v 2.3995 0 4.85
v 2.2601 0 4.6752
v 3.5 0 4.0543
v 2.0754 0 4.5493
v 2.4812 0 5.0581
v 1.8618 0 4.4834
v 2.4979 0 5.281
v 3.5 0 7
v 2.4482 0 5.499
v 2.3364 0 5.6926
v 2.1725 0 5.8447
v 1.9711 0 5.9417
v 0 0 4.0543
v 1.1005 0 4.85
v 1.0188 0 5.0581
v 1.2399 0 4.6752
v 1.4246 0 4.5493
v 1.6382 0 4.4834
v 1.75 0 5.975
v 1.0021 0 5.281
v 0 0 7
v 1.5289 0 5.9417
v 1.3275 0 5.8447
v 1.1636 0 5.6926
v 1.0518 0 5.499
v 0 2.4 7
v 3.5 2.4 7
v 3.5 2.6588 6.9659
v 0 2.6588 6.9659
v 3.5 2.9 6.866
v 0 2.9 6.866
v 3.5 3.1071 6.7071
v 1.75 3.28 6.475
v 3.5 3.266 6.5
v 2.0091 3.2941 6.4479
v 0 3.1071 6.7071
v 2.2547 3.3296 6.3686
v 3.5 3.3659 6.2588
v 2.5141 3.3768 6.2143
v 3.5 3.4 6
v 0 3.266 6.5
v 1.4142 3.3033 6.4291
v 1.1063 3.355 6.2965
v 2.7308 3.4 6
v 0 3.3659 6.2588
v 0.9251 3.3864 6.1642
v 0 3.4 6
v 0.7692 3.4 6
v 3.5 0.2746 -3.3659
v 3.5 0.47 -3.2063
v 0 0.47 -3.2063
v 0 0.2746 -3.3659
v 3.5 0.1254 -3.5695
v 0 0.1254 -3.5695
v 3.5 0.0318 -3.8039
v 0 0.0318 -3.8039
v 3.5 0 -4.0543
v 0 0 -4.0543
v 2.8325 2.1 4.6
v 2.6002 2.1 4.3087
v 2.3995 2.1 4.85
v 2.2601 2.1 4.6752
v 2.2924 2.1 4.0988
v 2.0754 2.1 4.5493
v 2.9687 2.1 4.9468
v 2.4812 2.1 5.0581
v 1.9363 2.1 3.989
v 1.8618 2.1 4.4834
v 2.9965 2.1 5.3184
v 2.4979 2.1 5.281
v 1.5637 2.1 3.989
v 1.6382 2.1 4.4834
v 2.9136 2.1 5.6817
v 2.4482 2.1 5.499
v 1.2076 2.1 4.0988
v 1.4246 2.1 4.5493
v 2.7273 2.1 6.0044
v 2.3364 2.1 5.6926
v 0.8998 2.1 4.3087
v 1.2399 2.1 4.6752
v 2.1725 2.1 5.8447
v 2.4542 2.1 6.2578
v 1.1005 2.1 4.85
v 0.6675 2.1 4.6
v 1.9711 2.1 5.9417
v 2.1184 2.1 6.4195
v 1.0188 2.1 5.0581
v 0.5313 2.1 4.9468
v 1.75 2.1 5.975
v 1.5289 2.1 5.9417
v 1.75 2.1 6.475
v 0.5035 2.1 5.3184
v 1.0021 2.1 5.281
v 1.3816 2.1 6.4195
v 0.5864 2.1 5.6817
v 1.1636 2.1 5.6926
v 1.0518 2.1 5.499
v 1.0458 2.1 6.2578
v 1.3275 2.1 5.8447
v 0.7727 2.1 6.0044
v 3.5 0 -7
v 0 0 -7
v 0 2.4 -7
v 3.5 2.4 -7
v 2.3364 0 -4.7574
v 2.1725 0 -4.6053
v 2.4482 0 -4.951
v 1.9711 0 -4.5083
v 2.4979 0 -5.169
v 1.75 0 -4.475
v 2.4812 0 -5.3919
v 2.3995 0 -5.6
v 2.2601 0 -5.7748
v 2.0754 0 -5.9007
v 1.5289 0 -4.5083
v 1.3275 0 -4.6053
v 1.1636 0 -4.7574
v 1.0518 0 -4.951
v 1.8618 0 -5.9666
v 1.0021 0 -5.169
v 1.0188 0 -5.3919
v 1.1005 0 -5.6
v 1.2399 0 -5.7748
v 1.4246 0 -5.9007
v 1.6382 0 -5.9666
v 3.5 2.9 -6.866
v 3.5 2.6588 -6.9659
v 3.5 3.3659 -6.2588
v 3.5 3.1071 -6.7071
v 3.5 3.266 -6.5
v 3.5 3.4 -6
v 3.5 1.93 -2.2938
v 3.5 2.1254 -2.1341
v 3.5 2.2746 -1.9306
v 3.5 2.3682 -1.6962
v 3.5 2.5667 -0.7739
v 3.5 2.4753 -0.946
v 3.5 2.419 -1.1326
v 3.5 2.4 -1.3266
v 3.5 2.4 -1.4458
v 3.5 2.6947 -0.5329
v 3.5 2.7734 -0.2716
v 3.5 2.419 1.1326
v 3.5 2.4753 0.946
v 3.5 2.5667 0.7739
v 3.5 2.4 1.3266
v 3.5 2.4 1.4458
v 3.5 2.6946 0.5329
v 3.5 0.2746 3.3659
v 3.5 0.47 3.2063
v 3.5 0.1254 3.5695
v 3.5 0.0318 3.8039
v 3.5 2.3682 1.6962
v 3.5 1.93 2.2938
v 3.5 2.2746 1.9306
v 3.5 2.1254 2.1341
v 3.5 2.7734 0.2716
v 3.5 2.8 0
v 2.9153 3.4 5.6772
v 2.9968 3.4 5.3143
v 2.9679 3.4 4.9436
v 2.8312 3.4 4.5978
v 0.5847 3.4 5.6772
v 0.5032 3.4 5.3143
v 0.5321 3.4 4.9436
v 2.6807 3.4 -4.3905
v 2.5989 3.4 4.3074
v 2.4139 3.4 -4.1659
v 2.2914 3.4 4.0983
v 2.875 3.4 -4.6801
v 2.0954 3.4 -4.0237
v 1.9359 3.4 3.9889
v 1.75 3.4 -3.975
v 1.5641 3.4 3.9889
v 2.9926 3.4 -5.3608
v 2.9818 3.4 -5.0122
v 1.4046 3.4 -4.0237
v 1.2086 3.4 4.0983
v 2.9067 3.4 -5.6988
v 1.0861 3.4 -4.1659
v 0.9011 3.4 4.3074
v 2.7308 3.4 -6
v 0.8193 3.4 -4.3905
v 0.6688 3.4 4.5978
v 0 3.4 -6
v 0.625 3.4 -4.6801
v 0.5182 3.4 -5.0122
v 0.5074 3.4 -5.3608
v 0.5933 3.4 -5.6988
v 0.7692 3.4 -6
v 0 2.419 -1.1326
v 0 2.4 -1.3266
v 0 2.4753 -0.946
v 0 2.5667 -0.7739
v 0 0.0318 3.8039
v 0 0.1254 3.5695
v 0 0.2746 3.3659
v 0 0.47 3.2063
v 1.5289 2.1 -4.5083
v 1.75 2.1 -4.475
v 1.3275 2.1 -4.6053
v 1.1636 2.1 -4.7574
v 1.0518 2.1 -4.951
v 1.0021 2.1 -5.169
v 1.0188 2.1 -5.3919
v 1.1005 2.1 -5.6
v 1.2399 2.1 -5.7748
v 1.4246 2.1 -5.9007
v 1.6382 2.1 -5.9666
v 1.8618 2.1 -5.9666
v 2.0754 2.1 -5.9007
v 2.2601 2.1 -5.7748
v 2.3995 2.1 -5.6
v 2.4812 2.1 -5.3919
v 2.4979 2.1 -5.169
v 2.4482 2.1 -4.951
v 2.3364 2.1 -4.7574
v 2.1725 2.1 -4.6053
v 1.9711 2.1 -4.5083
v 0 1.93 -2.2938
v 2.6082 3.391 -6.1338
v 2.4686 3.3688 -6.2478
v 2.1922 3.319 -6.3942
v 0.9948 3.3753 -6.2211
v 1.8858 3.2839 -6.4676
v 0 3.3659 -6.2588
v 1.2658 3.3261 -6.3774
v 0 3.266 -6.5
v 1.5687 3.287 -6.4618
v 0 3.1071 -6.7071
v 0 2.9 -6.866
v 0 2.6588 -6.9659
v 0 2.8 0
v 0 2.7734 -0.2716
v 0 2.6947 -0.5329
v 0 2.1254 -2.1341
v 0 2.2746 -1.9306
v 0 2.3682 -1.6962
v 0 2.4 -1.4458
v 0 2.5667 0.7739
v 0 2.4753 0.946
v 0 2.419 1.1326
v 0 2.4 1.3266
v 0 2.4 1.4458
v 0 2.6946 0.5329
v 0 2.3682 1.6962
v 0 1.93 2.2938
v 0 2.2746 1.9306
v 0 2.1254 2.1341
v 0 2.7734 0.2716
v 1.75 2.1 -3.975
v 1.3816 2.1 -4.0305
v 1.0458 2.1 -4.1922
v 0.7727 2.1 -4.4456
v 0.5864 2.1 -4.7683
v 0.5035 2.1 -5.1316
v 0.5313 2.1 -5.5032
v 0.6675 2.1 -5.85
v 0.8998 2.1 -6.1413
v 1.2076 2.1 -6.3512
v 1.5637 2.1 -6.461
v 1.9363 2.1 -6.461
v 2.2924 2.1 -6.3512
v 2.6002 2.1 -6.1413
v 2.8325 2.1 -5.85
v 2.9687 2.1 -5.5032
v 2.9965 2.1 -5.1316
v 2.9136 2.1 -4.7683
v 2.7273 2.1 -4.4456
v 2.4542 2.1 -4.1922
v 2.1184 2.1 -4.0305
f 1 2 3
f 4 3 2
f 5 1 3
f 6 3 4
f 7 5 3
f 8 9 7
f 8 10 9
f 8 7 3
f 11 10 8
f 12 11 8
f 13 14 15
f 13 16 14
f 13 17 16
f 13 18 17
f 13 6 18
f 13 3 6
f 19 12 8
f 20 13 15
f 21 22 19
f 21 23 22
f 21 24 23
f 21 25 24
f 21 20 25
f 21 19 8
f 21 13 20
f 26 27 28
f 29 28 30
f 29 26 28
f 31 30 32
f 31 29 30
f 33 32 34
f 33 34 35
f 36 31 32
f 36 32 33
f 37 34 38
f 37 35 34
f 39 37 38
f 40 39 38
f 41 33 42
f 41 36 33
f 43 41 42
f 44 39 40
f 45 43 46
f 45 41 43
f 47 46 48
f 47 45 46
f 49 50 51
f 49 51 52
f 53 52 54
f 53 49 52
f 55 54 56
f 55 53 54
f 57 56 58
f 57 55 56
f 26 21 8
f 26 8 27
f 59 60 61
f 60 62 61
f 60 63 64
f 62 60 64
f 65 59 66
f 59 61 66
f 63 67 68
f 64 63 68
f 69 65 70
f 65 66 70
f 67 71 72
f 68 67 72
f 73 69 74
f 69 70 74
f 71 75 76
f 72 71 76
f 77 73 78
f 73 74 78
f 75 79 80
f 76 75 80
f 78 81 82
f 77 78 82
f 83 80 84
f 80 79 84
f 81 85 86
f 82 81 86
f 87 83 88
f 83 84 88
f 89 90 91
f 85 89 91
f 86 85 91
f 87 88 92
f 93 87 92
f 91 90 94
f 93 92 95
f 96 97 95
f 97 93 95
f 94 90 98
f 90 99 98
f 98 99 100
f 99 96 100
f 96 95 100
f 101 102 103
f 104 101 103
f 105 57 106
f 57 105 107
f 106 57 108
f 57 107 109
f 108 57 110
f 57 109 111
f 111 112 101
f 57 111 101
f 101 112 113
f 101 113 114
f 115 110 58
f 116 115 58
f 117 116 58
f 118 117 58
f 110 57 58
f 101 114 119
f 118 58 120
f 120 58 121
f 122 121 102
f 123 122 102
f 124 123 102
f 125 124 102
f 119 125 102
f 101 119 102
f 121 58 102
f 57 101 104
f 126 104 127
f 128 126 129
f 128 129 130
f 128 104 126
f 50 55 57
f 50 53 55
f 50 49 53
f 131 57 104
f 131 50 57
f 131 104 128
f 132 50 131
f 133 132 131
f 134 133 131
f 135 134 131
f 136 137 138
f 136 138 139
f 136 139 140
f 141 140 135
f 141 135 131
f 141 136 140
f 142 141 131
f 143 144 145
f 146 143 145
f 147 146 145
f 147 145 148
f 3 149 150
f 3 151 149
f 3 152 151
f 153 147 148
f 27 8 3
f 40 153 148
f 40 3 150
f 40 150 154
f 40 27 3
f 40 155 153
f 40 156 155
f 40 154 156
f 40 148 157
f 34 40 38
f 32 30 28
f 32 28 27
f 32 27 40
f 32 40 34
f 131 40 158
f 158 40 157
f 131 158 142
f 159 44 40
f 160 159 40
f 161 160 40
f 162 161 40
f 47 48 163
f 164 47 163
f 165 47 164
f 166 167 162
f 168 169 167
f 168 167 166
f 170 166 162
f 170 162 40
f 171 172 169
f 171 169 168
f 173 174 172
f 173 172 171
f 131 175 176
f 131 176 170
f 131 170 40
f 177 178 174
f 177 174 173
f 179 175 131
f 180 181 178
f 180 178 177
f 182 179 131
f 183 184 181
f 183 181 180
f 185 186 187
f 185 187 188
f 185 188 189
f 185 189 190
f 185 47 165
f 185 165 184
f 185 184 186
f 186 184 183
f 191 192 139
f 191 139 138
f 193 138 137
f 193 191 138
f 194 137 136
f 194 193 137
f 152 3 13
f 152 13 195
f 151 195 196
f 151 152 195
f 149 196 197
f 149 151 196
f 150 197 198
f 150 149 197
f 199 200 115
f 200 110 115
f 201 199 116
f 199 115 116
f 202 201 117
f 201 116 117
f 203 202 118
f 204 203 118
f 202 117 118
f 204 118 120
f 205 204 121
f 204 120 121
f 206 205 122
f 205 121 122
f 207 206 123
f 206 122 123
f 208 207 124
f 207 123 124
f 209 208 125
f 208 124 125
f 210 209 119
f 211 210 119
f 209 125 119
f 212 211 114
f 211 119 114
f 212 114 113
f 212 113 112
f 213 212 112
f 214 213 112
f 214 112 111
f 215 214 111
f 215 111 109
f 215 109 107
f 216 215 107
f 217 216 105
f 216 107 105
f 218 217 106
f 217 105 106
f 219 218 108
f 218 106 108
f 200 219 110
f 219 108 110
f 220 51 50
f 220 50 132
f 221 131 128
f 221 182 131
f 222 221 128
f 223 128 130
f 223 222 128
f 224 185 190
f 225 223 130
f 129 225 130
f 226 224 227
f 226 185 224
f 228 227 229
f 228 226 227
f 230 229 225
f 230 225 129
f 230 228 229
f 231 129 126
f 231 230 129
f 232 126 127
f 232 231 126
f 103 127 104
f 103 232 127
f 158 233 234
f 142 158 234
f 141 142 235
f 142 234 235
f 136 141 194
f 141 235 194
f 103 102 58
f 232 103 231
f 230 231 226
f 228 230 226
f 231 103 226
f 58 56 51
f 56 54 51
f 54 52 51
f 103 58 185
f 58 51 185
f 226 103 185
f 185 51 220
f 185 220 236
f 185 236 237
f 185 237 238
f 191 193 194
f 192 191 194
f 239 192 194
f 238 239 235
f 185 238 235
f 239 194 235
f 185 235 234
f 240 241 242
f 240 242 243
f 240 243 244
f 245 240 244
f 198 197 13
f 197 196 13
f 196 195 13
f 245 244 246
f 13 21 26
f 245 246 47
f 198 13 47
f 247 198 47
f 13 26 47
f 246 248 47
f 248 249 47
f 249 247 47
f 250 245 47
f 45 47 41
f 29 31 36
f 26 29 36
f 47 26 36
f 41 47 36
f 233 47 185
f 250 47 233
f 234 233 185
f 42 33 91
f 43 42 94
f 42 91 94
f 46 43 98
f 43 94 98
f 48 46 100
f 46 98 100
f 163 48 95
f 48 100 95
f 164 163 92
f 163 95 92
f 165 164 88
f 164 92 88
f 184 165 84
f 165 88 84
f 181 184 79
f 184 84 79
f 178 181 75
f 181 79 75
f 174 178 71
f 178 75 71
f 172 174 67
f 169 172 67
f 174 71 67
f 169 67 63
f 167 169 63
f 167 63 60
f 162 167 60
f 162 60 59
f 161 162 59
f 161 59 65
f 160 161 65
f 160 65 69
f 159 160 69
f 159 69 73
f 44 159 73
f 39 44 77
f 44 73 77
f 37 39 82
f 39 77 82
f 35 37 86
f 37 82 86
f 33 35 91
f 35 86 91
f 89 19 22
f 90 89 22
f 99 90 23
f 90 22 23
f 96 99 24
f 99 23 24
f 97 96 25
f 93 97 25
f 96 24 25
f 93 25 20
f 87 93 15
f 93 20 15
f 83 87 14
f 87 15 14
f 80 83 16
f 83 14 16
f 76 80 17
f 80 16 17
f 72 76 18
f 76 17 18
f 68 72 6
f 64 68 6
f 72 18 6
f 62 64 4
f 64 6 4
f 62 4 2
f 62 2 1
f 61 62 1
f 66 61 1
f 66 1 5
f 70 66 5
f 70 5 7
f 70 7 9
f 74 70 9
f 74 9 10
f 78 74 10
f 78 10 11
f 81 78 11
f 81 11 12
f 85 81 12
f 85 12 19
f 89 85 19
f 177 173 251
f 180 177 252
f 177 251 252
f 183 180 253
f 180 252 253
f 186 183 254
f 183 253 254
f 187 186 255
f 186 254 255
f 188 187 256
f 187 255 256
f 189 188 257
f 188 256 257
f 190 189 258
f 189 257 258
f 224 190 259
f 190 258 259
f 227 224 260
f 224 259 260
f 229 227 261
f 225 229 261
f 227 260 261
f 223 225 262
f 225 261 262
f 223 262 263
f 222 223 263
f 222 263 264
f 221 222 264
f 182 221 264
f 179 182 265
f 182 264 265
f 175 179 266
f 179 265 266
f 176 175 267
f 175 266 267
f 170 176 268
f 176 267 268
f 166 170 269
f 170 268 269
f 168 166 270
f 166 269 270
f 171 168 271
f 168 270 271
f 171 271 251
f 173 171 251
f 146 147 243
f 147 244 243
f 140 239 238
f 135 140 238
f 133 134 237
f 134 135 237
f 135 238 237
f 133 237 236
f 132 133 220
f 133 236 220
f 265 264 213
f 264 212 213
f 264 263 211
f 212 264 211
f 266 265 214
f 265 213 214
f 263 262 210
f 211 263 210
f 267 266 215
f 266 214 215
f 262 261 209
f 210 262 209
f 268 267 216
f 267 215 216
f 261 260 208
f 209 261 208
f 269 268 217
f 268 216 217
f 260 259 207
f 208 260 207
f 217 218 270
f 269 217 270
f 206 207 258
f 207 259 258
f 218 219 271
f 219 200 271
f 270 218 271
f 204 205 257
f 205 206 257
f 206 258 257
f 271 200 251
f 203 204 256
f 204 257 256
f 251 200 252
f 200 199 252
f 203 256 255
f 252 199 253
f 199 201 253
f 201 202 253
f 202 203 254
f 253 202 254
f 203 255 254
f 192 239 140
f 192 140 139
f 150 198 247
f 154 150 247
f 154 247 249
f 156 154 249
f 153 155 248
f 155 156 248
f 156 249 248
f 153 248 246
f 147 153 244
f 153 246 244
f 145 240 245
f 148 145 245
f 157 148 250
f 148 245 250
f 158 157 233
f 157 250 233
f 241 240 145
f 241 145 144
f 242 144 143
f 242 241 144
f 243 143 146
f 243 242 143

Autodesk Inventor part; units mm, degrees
ref_plane "YZ Plane" through (0, 0, 0) normal (1, 0, 0) x (0, 1, 0)
ref_plane "XZ Plane" through (0, 0, 0) normal (0, 1, 0) x (-1, 0, 0)
ref_plane "XY Plane" through (0, 0, 0) normal (0, 0, 1) x (1, 0, 0)
sketch "Sketch1" plane through (0, 0, 0) normal (1, 0, 0) x (0, 1, 0)
  arc A0 (2.8, 0) -> (2.5667, 0.7739) centre (1.4, 0) ccw
  line L0 (0, 7.7385) -> (0, -8.1997) construction
  line L1 (-1.7375, 0) -> (6.7594, 0) construction
  line L2 (0, 3.5) -> (1.93, 2.2938)
  line L3 (2.4, 1.4458) -> (2.4, 1.3266)
  arc A1 (2.4, 1.4458) -> (1.93, 2.2938) centre (1.4, 1.4458) ccw
  line L4 (0, 3.5) -> (0, 7)
  line L5 (0, 7) -> (2.4, 7)
  line L6 (3.4, 6) -> (3.4, 0)
  arc A2 (3.4, 6) -> (2.4, 7) centre (2.4, 6) ccw
  arc A3 (2.4, 1.3266) -> (2.5667, 0.7739) centre (3.4, 1.3266) ccw
  arc A4 (2.5667, -0.7739) -> (2.8, 0) centre (1.4, 0) ccw
  line L7 (0, -3.5) -> (1.93, -2.2938)
  line L8 (2.4, -1.4458) -> (2.4, -1.3266)
  arc A5 (1.93, -2.2938) -> (2.4, -1.4458) centre (1.4, -1.4458) ccw
  line L9 (0, -3.5) -> (0, -7)
  line L10 (0, -7) -> (2.4, -7)
  line L11 (3.4, -6) -> (3.4, 0)
  arc A6 (2.4, -7) -> (3.4, -6) centre (2.4, -6) ccw
  arc A7 (2.5667, -0.7739) -> (2.4, -1.3266) centre (3.4, -1.3266) ccw
  point P0 (0, 0)
  point P1 (2.4, 2)
  point P2 (2.4, 0.9798)
  point P3 (3.4, 7)
  point P4 (0, -7.7385)
  dimension "d0" = 2.8
  dimension "d1" = 1
  dimension "d2" = 3.5
  dimension "d3" = 2
  dimension "d4" = 1
  dimension "d5" = 7
  dimension "d6" = 2
  dimension "d7" = 7
  dimension "d8" = 1
  dimension "d9" = 1
extrude "Extrusion1" add sketch "Sketch1" along normal blind 3.5
sketch "Sketch2" plane through (0, 3.4, 6) normal (0, 1, 0) x (1, 0, 0)
  line L0 (0, 6) -> (3.5416, 6) construction
  line L1 (0, -1) -> (3.5, -1) projected
  line L2 (1.75, -1) -> (1.75, 12.2689) construction
  point P0 (1.75, 0.775)
  point P1 (1.75, 11.225)
  dimension "d12" = 5.225
hole "Hole1" at (1.75, 3.4, 5.225) at (1.75, 3.4, -5.225) direction (0, -1, 0) diameter 1.5 end through all counterbore diameter 2.5 counterbore depth 1.3
fillet "Fillet1" radius 1 2 edges at (1.75, 0, 3.5) (1.75, 0, -3.5)
properties part number "3rd_phalanx_fingertip_holer"
